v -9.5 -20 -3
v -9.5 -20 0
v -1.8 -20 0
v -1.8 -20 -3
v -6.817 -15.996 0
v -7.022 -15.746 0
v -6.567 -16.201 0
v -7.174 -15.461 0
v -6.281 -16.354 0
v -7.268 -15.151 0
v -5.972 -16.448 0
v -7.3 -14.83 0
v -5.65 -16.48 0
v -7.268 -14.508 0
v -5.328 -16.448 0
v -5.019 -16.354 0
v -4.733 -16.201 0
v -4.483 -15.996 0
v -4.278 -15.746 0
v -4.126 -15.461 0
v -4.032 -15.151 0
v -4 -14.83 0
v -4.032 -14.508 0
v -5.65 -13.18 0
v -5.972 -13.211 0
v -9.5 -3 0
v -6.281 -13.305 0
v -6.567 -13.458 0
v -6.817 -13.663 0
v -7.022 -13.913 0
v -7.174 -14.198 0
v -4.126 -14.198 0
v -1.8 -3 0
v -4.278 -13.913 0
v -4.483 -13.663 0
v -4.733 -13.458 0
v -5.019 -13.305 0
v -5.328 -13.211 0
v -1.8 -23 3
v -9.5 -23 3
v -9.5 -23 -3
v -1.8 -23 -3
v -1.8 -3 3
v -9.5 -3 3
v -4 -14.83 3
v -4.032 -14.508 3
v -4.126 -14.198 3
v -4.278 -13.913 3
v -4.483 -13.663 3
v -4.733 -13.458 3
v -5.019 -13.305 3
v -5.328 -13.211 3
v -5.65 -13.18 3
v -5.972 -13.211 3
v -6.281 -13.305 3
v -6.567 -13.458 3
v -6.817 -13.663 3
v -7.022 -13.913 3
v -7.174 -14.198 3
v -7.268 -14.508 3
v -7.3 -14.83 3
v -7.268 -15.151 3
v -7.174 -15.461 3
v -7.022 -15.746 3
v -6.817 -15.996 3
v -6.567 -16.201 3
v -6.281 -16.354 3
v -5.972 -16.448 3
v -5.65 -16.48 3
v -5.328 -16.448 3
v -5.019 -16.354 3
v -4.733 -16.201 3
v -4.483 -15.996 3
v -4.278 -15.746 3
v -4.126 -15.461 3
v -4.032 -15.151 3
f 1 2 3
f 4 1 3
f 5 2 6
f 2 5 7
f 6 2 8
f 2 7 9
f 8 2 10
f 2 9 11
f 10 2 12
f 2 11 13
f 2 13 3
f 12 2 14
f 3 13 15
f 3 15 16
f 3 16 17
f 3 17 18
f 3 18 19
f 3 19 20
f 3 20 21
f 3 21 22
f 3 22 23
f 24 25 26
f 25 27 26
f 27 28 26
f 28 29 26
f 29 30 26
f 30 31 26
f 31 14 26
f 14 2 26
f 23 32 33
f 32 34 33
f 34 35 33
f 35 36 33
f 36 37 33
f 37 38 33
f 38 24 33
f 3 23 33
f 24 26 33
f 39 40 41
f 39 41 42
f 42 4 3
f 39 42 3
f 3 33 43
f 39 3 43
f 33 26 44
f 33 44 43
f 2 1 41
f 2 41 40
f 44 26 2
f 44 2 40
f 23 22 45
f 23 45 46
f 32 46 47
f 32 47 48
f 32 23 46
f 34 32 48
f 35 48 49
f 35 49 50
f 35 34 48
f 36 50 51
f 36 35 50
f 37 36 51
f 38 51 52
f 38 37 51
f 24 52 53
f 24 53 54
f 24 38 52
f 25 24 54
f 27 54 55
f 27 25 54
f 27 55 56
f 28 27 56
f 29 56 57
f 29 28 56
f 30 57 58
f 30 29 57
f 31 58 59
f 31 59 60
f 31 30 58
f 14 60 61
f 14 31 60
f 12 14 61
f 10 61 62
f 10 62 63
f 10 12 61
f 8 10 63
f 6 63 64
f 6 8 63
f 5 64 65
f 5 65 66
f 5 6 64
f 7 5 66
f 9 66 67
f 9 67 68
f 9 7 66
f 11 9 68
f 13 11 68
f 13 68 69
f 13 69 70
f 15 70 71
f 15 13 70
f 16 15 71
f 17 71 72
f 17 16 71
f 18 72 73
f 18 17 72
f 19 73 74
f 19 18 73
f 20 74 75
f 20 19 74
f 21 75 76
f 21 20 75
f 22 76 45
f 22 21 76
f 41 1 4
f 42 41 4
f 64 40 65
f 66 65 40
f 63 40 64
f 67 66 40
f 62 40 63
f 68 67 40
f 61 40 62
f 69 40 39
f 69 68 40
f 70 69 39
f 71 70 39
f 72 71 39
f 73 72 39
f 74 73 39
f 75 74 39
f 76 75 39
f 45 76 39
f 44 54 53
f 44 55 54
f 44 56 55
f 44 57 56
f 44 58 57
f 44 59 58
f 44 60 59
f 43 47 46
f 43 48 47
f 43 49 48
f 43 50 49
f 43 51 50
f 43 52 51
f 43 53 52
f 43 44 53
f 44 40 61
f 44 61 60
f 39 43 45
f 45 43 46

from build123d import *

# Parameters (mm, degrees)
SKETCH1_W           = 7.7
SKETCH1_H           = 17
SKETCH1_R           = 1.65
BOSS_EXTRUDE1_DEPTH = 3
SKETCH2_W           = 7.7
SKETCH2_H           = 6
BOSS_EXTRUDE2_DEPTH = 3


with BuildPart() as part:
    # Sketch1 → Boss-Extrude1 (new body)
    with BuildSketch(Plane.XY):
        with Locations((-5.65, -11.5)):
            Rectangle(SKETCH1_W, SKETCH1_H)
        with Locations((-5.65, -14.829504021)):
            Circle(SKETCH1_R, mode=Mode.SUBTRACT)
    extrude(amount=BOSS_EXTRUDE1_DEPTH)

    # Sketch2 → Boss-Extrude2 (add)
    with BuildSketch(Plane.XZ.offset(20)):
        with Locations((-5.65, 0)):
            Rectangle(SKETCH2_W, SKETCH2_H)
    extrude(amount=BOSS_EXTRUDE2_DEPTH)


solid = part.part
